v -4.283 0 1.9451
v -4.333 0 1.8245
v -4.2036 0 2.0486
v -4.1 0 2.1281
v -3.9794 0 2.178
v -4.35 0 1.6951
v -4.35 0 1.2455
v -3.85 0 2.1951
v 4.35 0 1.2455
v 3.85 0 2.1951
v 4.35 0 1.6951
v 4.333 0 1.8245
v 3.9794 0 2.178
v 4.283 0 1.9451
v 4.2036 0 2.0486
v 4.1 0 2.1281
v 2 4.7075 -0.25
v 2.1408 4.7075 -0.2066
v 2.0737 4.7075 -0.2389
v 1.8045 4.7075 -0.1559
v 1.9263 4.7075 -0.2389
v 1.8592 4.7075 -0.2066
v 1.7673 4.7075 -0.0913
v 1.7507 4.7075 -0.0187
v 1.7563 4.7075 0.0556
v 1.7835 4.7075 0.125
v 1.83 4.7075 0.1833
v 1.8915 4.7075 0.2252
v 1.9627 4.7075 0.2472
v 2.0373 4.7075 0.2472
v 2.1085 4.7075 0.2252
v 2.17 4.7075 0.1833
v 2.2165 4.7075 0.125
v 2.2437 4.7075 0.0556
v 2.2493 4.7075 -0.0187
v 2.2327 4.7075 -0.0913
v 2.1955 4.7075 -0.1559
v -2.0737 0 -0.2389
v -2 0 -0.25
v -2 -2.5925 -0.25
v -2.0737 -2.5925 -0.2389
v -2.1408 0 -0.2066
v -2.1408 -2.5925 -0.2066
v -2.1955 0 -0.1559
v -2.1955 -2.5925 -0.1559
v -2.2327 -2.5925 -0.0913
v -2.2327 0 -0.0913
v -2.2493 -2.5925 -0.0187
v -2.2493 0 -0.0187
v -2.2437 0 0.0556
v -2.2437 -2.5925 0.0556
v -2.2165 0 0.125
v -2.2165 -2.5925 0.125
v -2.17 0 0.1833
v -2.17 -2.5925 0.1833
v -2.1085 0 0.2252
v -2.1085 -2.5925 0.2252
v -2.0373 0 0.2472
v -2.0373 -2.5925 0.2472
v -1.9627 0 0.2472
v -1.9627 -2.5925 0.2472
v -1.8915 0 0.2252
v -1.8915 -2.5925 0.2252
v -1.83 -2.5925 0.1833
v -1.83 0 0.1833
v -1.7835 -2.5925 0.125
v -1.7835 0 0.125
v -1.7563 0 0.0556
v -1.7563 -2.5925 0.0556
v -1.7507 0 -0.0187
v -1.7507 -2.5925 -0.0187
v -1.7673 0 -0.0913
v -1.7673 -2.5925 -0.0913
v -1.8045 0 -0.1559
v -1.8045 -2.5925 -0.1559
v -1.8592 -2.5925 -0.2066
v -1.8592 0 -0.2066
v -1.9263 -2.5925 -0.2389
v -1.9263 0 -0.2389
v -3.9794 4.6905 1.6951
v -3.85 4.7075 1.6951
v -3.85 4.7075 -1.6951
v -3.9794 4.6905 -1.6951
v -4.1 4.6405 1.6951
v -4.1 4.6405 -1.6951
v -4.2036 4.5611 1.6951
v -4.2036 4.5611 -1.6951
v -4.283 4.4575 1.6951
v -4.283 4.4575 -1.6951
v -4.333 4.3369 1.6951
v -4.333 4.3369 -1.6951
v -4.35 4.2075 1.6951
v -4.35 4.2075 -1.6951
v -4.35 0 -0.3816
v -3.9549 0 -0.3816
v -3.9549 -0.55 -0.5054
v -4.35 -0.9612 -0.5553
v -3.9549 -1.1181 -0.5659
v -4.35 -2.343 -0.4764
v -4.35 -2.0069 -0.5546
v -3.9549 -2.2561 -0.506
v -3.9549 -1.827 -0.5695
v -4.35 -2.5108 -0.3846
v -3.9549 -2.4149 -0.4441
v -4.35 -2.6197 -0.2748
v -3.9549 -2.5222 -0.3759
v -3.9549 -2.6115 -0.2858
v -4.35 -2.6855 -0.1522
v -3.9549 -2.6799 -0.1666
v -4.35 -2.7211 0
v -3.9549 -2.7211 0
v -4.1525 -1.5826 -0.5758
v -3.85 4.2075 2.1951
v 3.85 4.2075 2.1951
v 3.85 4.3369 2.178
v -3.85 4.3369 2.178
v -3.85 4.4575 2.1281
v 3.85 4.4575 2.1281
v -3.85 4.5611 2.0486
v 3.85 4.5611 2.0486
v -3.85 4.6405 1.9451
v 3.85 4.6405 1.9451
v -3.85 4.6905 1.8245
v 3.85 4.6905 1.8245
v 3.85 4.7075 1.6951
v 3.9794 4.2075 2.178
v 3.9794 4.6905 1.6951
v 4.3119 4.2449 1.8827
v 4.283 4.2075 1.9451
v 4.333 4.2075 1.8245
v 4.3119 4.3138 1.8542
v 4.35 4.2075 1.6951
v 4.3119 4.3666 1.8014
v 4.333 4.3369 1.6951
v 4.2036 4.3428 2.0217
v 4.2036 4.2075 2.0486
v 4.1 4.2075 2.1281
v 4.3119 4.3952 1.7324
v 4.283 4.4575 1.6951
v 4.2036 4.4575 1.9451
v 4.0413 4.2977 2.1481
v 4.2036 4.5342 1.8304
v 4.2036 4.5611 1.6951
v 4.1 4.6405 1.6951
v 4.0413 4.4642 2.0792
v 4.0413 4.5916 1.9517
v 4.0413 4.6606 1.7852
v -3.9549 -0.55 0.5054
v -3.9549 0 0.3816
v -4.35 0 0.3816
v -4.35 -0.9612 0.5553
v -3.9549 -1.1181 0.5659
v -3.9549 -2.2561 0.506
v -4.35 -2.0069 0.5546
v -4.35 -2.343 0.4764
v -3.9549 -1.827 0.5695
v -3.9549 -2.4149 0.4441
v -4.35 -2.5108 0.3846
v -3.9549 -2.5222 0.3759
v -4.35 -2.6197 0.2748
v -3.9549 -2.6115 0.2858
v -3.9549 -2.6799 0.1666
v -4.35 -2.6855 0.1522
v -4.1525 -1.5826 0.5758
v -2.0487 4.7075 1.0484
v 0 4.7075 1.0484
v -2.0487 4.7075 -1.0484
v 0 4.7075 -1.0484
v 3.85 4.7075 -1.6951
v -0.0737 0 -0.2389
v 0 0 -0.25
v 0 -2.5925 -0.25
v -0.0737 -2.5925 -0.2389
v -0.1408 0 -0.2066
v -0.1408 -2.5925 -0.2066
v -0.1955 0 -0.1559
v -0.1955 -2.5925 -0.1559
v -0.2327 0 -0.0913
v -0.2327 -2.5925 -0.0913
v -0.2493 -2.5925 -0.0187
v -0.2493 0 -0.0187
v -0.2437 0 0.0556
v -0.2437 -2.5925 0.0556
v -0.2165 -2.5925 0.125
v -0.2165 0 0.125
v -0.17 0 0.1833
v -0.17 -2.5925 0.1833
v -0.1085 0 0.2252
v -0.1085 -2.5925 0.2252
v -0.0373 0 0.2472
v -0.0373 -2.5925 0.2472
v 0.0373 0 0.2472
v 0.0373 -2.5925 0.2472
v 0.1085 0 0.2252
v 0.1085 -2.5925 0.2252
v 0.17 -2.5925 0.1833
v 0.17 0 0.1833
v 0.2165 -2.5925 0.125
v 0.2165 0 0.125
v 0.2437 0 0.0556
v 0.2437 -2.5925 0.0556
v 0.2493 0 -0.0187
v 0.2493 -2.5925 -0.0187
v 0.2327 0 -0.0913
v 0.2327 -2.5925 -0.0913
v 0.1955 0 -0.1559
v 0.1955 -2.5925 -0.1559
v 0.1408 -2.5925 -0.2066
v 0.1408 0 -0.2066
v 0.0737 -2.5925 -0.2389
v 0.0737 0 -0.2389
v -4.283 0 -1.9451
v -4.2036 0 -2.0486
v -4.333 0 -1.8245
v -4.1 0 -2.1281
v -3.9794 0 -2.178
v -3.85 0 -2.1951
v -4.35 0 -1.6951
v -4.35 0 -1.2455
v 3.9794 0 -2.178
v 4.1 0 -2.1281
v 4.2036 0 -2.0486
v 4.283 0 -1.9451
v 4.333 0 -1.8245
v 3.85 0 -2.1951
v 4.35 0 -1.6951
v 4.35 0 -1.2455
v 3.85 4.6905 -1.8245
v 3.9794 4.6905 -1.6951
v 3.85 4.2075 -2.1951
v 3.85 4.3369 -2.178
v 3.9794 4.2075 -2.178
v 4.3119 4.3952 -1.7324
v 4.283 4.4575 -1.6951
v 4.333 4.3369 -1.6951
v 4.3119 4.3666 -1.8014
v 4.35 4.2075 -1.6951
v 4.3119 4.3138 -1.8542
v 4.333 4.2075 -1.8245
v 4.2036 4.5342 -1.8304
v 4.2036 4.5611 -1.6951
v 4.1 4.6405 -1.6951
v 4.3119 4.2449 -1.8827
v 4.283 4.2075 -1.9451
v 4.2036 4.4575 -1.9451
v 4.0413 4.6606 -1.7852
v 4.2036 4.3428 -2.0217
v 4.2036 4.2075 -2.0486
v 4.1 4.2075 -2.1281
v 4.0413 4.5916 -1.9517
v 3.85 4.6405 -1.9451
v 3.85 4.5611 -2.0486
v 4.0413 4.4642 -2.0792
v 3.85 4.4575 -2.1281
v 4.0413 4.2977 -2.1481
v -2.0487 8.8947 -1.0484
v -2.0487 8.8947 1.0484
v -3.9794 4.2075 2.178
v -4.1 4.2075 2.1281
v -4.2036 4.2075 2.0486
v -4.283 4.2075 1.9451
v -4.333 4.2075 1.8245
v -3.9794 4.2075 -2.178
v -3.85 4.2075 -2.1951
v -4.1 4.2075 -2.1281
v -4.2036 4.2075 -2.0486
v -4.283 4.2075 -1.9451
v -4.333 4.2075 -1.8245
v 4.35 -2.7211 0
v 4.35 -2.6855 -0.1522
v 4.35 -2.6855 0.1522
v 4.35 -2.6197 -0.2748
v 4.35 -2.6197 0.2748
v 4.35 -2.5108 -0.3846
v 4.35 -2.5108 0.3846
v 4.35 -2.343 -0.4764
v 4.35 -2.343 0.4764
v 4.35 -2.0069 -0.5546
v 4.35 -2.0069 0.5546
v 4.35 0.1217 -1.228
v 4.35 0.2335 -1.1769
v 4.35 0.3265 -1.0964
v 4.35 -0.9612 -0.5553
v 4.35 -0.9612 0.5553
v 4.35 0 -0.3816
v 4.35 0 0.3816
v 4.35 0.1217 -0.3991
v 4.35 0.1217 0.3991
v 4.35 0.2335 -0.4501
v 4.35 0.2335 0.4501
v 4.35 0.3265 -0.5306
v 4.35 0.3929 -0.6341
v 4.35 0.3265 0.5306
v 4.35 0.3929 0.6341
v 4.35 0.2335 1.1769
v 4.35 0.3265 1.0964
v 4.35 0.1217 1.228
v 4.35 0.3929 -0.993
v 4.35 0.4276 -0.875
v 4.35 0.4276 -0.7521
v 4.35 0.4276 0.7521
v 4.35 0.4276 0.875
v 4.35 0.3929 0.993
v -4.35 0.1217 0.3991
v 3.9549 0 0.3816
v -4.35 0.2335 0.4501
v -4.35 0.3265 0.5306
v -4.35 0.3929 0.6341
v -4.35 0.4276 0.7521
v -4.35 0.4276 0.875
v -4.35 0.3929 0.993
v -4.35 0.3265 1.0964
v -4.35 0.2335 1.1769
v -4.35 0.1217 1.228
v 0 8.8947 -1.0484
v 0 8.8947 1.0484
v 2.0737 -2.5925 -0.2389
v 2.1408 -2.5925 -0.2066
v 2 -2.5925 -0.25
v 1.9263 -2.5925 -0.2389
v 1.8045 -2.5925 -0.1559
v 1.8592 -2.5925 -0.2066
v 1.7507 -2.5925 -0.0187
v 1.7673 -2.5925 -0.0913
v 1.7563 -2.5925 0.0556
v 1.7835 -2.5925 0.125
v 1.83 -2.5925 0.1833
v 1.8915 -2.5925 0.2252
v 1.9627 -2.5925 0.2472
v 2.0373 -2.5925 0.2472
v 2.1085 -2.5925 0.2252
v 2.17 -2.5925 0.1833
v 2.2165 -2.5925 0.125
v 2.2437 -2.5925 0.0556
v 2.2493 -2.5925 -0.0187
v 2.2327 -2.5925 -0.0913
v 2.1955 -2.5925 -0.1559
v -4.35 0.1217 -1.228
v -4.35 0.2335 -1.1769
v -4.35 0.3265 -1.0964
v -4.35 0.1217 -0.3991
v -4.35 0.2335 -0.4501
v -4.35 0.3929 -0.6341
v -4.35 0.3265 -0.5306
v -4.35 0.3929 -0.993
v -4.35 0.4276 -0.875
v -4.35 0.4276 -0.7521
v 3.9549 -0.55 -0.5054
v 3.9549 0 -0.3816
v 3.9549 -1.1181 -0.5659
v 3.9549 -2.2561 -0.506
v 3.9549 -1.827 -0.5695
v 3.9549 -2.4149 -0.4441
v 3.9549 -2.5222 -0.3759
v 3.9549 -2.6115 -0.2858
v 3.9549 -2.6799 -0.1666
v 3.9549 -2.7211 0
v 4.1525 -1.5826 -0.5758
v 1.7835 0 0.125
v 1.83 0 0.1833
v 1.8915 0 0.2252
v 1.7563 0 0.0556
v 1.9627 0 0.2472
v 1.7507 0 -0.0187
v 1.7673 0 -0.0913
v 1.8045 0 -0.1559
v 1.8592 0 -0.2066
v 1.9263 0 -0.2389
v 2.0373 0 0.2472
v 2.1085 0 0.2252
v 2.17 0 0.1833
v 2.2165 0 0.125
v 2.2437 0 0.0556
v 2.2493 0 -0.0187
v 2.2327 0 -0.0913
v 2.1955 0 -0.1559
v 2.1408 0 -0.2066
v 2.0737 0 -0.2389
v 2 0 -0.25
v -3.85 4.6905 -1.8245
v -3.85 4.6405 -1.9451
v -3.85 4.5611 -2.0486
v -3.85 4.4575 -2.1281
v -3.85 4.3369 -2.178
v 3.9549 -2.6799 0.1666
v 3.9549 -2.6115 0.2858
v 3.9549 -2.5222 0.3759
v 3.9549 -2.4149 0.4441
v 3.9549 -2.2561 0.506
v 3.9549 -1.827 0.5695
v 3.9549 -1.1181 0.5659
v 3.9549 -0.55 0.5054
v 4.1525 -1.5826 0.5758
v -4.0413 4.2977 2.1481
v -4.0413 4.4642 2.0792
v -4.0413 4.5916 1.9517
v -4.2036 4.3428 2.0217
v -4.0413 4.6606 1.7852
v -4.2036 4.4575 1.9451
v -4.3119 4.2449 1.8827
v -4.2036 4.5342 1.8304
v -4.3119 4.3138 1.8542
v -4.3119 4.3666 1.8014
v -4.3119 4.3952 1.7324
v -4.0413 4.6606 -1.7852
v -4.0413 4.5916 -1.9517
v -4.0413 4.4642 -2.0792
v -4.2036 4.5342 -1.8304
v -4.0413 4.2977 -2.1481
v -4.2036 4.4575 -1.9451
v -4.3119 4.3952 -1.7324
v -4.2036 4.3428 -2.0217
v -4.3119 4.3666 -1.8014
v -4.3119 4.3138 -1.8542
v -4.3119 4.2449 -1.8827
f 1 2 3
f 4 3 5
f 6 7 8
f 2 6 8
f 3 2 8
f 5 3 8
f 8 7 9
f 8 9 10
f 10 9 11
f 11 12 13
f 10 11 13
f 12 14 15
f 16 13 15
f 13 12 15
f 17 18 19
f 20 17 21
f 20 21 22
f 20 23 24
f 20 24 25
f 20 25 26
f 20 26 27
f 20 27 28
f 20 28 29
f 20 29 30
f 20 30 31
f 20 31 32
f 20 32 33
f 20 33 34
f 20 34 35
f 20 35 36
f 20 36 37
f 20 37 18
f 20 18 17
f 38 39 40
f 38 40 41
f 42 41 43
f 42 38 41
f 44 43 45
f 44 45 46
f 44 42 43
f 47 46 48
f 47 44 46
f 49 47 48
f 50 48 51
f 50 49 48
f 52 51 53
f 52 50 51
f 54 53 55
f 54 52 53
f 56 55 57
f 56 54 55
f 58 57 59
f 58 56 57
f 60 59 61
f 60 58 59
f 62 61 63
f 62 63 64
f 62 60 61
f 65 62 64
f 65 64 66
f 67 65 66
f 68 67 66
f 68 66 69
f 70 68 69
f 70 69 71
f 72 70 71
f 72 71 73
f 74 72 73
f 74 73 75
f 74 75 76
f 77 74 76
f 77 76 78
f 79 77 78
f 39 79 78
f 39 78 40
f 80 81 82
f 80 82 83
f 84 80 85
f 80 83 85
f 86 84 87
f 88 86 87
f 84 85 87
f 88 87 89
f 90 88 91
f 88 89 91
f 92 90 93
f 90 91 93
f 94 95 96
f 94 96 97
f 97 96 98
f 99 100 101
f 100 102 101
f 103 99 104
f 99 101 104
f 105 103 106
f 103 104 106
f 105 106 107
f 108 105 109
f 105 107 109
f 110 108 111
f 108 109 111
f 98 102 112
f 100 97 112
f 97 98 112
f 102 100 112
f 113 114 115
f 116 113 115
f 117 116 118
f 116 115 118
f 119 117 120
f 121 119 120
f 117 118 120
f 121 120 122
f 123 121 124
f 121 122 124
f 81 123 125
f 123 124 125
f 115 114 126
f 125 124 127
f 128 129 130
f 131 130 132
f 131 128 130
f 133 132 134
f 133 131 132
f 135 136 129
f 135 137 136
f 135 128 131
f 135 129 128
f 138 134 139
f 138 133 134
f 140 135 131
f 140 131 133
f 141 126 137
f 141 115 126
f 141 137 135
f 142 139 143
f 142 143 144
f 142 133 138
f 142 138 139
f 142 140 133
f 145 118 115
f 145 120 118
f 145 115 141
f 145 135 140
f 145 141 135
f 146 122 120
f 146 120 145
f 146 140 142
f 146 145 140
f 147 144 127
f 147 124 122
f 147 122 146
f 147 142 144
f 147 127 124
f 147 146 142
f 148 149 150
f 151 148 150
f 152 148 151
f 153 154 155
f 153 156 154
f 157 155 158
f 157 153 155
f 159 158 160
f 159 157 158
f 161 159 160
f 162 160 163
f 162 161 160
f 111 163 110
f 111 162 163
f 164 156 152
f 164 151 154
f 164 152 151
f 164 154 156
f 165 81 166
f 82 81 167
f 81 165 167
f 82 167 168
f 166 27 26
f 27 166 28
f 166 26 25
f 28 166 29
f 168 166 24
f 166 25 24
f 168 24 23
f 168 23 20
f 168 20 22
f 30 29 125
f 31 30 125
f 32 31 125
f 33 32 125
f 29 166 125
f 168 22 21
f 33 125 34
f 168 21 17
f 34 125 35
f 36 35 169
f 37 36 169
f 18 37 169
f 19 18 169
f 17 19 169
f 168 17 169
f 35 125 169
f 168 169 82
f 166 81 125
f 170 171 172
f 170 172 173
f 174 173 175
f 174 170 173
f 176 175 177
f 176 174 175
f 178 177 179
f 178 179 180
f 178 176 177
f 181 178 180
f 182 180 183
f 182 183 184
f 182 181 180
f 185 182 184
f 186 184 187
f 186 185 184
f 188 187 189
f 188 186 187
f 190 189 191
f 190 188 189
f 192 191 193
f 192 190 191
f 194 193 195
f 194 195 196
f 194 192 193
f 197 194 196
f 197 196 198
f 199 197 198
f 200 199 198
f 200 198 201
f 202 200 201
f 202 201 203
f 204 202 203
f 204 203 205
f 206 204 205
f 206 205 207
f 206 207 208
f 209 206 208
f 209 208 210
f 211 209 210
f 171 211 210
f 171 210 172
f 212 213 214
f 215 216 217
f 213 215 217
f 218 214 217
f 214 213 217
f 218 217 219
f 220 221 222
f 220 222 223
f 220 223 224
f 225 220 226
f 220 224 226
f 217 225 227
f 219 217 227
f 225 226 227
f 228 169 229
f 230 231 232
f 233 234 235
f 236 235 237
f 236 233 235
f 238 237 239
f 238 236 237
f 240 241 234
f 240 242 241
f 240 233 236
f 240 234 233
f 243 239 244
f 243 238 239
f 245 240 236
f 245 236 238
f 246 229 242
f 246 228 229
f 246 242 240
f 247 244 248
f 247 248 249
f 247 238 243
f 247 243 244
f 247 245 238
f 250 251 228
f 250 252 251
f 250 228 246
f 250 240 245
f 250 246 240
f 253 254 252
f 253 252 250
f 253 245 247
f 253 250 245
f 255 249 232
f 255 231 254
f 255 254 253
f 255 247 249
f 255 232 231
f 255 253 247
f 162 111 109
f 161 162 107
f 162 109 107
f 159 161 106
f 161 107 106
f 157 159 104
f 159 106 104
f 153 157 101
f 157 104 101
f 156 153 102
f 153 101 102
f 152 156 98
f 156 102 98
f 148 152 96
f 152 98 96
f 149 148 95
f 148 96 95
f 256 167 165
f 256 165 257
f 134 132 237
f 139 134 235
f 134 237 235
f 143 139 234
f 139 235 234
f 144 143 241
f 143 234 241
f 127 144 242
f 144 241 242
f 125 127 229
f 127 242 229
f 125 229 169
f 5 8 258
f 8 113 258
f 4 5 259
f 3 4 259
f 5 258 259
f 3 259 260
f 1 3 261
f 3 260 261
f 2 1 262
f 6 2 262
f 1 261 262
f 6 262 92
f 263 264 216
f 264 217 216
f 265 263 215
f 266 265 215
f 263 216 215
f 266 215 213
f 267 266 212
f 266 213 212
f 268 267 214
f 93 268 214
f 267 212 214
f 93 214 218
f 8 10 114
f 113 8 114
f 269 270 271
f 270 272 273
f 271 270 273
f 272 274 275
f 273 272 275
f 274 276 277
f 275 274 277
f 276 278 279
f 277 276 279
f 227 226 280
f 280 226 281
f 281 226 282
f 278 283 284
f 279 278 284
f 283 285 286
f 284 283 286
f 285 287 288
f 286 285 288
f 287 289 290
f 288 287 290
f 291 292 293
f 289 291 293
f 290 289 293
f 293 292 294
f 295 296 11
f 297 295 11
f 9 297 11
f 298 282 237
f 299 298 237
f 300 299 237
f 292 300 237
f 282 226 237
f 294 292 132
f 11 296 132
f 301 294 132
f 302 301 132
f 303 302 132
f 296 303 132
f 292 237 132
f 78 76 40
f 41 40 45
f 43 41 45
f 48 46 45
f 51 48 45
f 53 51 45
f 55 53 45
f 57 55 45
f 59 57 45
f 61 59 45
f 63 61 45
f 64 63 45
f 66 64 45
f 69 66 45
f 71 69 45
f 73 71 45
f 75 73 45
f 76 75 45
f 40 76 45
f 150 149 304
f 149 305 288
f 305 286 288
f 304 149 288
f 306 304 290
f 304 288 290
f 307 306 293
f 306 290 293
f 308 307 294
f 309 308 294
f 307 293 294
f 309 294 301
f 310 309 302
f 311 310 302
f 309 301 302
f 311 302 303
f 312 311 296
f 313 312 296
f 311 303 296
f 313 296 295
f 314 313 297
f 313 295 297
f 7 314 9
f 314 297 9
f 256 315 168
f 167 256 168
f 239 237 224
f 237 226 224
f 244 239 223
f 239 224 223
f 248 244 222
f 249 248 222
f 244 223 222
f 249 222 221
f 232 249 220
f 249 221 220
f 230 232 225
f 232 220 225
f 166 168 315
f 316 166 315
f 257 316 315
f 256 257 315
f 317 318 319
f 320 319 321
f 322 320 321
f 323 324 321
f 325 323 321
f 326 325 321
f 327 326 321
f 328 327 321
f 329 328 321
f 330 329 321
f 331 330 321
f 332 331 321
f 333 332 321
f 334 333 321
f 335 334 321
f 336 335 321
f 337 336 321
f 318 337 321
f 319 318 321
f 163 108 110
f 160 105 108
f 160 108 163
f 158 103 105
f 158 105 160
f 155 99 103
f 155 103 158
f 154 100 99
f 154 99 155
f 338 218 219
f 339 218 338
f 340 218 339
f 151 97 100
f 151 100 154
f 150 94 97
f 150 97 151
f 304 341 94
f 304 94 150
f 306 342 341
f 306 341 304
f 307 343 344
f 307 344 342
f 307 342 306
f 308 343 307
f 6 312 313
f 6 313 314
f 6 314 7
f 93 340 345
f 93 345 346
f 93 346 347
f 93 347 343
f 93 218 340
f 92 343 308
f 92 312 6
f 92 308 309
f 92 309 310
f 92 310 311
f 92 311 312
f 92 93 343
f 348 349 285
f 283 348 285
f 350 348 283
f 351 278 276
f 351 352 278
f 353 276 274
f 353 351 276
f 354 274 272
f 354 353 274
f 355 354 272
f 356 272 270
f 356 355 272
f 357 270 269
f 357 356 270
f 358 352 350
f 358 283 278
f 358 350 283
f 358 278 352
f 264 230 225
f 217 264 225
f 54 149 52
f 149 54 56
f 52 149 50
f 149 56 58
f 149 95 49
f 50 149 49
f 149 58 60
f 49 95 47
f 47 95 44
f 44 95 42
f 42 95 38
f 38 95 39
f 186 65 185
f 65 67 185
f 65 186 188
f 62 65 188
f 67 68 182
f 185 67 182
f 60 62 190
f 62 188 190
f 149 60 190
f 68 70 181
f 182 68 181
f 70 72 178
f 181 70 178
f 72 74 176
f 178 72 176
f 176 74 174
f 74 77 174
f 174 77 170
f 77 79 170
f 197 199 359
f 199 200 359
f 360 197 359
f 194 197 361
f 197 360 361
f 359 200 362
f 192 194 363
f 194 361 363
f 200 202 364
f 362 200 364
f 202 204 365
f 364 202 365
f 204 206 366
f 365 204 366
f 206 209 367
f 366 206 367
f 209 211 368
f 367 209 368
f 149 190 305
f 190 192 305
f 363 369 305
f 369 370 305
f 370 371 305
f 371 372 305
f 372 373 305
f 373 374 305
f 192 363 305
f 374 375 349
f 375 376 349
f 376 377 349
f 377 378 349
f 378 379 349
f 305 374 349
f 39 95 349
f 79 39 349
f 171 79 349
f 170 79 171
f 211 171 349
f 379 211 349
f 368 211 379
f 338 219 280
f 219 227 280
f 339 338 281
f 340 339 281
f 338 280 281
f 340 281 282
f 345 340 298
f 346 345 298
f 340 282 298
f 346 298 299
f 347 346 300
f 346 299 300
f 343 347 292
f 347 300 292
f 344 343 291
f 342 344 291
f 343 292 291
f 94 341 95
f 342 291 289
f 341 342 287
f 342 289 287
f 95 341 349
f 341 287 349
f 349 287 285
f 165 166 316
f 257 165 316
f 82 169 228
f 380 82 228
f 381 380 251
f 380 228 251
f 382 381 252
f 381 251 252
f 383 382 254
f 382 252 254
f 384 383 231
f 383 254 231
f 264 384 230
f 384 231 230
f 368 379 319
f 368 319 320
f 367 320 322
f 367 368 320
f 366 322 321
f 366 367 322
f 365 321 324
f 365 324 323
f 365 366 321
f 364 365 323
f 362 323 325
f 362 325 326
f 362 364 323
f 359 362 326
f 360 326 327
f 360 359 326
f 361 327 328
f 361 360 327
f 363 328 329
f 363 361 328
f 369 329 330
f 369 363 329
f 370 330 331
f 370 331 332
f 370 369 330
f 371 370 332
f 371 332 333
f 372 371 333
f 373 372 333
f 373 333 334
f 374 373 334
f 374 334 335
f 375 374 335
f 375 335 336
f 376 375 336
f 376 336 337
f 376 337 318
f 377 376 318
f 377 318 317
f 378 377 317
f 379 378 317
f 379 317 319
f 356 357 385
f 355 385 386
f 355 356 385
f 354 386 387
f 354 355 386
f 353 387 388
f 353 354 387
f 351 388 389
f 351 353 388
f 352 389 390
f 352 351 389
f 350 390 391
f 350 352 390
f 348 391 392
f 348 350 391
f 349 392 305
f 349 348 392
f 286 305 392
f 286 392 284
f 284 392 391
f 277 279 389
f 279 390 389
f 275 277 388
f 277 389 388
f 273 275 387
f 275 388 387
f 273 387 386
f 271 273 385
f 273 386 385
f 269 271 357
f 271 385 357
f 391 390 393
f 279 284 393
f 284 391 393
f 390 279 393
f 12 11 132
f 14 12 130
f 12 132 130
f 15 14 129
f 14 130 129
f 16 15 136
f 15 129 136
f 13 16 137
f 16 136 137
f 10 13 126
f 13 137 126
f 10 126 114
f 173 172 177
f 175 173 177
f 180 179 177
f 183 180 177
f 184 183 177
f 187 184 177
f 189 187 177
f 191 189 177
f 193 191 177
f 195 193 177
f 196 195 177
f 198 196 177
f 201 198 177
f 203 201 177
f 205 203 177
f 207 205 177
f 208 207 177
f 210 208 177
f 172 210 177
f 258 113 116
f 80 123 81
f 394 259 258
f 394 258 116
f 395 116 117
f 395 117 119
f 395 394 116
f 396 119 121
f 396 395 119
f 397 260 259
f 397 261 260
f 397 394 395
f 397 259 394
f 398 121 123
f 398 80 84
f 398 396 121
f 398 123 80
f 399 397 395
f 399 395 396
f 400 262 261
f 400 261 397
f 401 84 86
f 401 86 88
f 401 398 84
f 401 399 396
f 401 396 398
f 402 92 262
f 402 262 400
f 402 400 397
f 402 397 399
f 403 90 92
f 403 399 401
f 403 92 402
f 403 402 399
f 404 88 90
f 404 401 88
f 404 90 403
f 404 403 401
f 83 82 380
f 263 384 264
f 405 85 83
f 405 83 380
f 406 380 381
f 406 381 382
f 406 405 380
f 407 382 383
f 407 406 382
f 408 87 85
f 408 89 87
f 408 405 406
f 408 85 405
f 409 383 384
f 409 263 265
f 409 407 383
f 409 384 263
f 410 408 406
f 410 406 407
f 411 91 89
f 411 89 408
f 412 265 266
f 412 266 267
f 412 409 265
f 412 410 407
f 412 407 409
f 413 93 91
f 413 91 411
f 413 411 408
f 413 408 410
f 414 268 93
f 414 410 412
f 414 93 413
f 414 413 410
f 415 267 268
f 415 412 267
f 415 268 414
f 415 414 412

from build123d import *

# Parameters (mm, degrees)
EXTRUDE_1_DEPTH     = 4.35
CUT_EXTRUDE_START   = -2.195068
SKETCH_2_W          = 7.909800434
SKETCH_2_H          = 2.721108573
SKETCH_2_W_2        = 2.301330542
SKETCH_2_H_2        = 4.187137181
SKETCH_2_W_3        = 4.35
CUT_EXTRUDE_1_DEPTH = 13.336862915
FILLET_1_R          = 0.5
EXTRUDE_START       = 4.707534
SKETCH_3_R          = 0.25
EXTRUDE_2_DEPTH     = 7.3


with BuildPart() as part:
    # Эскиз1 → Бобышка-Вытянуть1 (new, symmetric)
    with BuildSketch(Plane(origin=(0, 0, 0), x_dir=(0, 0, -1), z_dir=(1, 0, 0))):
        with BuildLine():
            Line((-2.195067928, 0), (-2.195067928, 4.207534134))
            ThreePointArc((-2.195067928, 4.207534134), (-2.048621319, 4.561087525), (-1.695067928, 4.707534134))
            Line((-1.695067928, 4.707534134), (-1.048425102, 4.707534134))
            Line((-1.048425102, 4.707534134), (-1.048425102, 8.894671315))
            Line((-1.048425102, 8.894671315), (1.048425102, 8.894671315))
            Line((1.048425102, 8.894671315), (1.048425102, 4.707534134))
            Line((1.048425102, 4.707534134), (1.695067928, 4.707534134))
            ThreePointArc((1.695067928, 4.707534134), (2.048621319, 4.561087525), (2.195067928, 4.207534134))
            Line((2.195067928, 4.207534134), (2.195067928, 0))
            Line((2.195067928, 0), (1.245504338, 0))
            ThreePointArc((1.245504338, 0), (0.813528527, 0.431975811), (0.381552716, 0))
            add(Edge.make_bspline(
                [(0.381552716, 0), (0.533291167, -0.533550096), (0.61904307, -1.408984288), (0.53277478, -2.660476036), (0, -2.721108573)],
                knots=[0, 0, 0, 0, 0.537169864, 1, 1, 1, 1], degree=3))
            add(Edge.make_bspline(
                [(-0.381552716, 0), (-0.533291167, -0.533550096), (-0.61904307, -1.408984288), (-0.53277478, -2.660476036), (0, -2.721108573)],
                knots=[0, 0, 0, 0, 0.537169864, 1, 1, 1, 1], degree=3))
            ThreePointArc((-0.381552716, 0), (-0.813528527, 0.431975811), (-1.245504338, 0))
            Line((-1.245504338, 0), (-2.195067928, 0))
        make_face()
    extrude(amount=EXTRUDE_1_DEPTH, both=True)

    # Эскиз2 → Вырез-Вытянуть1 (cut, through all)
    with BuildSketch(Plane.XY.offset(CUT_EXTRUDE_START)):
        with Locations((0, -1.360554286)):
            Rectangle(SKETCH_2_W, SKETCH_2_H)
        with Locations((-3.199334729, 6.801102724)):
            Rectangle(SKETCH_2_W_2, SKETCH_2_H_2)
        with Locations((2.175, 6.801102724)):
            Rectangle(SKETCH_2_W_3, SKETCH_2_H_2)
    extrude(amount=CUT_EXTRUDE_1_DEPTH, mode=Mode.SUBTRACT)

    # Скругление1
    fillet_1_edges = [part.edges().sort_by_distance(p)[0] for p in [
        (-4.35, 2.103767067, 2.195067928),
        (-4.35, 4.561087525, 2.048621319),
        (-4.35, 4.707534134, 0),
        (-4.35, 4.561087525, -2.048621319),
        (-4.35, 2.103767067, -2.195067928),
        (4.35, 2.103767067, -2.195067928),
        (4.35, 4.561087525, -2.048621319),
        (4.35, 4.707534134, 0),
        (4.35, 4.561087525, 2.048621319),
        (4.35, 2.103767067, 2.195067928),
    ]]
    fillet(fillet_1_edges, radius=FILLET_1_R)

    # Эскиз3 → Бобышка-Вытянуть2 (add)
    with BuildSketch(Plane(origin=(0, 0, 0), x_dir=(1, 0, 0), z_dir=(0, 1, 0)).offset(EXTRUDE_START)):
        with Locations(Location((0, 0, 0), (0, 0, 90))):
            Circle(SKETCH_3_R)
        with Locations(Location((-2, 0, 0), (0, 0, 90))):
            Circle(SKETCH_3_R)
        with Locations(Location((2, 0, 0), (0, 0, 90))):
            Circle(SKETCH_3_R)
    extrude(amount=-EXTRUDE_2_DEPTH)


solid = part.part
